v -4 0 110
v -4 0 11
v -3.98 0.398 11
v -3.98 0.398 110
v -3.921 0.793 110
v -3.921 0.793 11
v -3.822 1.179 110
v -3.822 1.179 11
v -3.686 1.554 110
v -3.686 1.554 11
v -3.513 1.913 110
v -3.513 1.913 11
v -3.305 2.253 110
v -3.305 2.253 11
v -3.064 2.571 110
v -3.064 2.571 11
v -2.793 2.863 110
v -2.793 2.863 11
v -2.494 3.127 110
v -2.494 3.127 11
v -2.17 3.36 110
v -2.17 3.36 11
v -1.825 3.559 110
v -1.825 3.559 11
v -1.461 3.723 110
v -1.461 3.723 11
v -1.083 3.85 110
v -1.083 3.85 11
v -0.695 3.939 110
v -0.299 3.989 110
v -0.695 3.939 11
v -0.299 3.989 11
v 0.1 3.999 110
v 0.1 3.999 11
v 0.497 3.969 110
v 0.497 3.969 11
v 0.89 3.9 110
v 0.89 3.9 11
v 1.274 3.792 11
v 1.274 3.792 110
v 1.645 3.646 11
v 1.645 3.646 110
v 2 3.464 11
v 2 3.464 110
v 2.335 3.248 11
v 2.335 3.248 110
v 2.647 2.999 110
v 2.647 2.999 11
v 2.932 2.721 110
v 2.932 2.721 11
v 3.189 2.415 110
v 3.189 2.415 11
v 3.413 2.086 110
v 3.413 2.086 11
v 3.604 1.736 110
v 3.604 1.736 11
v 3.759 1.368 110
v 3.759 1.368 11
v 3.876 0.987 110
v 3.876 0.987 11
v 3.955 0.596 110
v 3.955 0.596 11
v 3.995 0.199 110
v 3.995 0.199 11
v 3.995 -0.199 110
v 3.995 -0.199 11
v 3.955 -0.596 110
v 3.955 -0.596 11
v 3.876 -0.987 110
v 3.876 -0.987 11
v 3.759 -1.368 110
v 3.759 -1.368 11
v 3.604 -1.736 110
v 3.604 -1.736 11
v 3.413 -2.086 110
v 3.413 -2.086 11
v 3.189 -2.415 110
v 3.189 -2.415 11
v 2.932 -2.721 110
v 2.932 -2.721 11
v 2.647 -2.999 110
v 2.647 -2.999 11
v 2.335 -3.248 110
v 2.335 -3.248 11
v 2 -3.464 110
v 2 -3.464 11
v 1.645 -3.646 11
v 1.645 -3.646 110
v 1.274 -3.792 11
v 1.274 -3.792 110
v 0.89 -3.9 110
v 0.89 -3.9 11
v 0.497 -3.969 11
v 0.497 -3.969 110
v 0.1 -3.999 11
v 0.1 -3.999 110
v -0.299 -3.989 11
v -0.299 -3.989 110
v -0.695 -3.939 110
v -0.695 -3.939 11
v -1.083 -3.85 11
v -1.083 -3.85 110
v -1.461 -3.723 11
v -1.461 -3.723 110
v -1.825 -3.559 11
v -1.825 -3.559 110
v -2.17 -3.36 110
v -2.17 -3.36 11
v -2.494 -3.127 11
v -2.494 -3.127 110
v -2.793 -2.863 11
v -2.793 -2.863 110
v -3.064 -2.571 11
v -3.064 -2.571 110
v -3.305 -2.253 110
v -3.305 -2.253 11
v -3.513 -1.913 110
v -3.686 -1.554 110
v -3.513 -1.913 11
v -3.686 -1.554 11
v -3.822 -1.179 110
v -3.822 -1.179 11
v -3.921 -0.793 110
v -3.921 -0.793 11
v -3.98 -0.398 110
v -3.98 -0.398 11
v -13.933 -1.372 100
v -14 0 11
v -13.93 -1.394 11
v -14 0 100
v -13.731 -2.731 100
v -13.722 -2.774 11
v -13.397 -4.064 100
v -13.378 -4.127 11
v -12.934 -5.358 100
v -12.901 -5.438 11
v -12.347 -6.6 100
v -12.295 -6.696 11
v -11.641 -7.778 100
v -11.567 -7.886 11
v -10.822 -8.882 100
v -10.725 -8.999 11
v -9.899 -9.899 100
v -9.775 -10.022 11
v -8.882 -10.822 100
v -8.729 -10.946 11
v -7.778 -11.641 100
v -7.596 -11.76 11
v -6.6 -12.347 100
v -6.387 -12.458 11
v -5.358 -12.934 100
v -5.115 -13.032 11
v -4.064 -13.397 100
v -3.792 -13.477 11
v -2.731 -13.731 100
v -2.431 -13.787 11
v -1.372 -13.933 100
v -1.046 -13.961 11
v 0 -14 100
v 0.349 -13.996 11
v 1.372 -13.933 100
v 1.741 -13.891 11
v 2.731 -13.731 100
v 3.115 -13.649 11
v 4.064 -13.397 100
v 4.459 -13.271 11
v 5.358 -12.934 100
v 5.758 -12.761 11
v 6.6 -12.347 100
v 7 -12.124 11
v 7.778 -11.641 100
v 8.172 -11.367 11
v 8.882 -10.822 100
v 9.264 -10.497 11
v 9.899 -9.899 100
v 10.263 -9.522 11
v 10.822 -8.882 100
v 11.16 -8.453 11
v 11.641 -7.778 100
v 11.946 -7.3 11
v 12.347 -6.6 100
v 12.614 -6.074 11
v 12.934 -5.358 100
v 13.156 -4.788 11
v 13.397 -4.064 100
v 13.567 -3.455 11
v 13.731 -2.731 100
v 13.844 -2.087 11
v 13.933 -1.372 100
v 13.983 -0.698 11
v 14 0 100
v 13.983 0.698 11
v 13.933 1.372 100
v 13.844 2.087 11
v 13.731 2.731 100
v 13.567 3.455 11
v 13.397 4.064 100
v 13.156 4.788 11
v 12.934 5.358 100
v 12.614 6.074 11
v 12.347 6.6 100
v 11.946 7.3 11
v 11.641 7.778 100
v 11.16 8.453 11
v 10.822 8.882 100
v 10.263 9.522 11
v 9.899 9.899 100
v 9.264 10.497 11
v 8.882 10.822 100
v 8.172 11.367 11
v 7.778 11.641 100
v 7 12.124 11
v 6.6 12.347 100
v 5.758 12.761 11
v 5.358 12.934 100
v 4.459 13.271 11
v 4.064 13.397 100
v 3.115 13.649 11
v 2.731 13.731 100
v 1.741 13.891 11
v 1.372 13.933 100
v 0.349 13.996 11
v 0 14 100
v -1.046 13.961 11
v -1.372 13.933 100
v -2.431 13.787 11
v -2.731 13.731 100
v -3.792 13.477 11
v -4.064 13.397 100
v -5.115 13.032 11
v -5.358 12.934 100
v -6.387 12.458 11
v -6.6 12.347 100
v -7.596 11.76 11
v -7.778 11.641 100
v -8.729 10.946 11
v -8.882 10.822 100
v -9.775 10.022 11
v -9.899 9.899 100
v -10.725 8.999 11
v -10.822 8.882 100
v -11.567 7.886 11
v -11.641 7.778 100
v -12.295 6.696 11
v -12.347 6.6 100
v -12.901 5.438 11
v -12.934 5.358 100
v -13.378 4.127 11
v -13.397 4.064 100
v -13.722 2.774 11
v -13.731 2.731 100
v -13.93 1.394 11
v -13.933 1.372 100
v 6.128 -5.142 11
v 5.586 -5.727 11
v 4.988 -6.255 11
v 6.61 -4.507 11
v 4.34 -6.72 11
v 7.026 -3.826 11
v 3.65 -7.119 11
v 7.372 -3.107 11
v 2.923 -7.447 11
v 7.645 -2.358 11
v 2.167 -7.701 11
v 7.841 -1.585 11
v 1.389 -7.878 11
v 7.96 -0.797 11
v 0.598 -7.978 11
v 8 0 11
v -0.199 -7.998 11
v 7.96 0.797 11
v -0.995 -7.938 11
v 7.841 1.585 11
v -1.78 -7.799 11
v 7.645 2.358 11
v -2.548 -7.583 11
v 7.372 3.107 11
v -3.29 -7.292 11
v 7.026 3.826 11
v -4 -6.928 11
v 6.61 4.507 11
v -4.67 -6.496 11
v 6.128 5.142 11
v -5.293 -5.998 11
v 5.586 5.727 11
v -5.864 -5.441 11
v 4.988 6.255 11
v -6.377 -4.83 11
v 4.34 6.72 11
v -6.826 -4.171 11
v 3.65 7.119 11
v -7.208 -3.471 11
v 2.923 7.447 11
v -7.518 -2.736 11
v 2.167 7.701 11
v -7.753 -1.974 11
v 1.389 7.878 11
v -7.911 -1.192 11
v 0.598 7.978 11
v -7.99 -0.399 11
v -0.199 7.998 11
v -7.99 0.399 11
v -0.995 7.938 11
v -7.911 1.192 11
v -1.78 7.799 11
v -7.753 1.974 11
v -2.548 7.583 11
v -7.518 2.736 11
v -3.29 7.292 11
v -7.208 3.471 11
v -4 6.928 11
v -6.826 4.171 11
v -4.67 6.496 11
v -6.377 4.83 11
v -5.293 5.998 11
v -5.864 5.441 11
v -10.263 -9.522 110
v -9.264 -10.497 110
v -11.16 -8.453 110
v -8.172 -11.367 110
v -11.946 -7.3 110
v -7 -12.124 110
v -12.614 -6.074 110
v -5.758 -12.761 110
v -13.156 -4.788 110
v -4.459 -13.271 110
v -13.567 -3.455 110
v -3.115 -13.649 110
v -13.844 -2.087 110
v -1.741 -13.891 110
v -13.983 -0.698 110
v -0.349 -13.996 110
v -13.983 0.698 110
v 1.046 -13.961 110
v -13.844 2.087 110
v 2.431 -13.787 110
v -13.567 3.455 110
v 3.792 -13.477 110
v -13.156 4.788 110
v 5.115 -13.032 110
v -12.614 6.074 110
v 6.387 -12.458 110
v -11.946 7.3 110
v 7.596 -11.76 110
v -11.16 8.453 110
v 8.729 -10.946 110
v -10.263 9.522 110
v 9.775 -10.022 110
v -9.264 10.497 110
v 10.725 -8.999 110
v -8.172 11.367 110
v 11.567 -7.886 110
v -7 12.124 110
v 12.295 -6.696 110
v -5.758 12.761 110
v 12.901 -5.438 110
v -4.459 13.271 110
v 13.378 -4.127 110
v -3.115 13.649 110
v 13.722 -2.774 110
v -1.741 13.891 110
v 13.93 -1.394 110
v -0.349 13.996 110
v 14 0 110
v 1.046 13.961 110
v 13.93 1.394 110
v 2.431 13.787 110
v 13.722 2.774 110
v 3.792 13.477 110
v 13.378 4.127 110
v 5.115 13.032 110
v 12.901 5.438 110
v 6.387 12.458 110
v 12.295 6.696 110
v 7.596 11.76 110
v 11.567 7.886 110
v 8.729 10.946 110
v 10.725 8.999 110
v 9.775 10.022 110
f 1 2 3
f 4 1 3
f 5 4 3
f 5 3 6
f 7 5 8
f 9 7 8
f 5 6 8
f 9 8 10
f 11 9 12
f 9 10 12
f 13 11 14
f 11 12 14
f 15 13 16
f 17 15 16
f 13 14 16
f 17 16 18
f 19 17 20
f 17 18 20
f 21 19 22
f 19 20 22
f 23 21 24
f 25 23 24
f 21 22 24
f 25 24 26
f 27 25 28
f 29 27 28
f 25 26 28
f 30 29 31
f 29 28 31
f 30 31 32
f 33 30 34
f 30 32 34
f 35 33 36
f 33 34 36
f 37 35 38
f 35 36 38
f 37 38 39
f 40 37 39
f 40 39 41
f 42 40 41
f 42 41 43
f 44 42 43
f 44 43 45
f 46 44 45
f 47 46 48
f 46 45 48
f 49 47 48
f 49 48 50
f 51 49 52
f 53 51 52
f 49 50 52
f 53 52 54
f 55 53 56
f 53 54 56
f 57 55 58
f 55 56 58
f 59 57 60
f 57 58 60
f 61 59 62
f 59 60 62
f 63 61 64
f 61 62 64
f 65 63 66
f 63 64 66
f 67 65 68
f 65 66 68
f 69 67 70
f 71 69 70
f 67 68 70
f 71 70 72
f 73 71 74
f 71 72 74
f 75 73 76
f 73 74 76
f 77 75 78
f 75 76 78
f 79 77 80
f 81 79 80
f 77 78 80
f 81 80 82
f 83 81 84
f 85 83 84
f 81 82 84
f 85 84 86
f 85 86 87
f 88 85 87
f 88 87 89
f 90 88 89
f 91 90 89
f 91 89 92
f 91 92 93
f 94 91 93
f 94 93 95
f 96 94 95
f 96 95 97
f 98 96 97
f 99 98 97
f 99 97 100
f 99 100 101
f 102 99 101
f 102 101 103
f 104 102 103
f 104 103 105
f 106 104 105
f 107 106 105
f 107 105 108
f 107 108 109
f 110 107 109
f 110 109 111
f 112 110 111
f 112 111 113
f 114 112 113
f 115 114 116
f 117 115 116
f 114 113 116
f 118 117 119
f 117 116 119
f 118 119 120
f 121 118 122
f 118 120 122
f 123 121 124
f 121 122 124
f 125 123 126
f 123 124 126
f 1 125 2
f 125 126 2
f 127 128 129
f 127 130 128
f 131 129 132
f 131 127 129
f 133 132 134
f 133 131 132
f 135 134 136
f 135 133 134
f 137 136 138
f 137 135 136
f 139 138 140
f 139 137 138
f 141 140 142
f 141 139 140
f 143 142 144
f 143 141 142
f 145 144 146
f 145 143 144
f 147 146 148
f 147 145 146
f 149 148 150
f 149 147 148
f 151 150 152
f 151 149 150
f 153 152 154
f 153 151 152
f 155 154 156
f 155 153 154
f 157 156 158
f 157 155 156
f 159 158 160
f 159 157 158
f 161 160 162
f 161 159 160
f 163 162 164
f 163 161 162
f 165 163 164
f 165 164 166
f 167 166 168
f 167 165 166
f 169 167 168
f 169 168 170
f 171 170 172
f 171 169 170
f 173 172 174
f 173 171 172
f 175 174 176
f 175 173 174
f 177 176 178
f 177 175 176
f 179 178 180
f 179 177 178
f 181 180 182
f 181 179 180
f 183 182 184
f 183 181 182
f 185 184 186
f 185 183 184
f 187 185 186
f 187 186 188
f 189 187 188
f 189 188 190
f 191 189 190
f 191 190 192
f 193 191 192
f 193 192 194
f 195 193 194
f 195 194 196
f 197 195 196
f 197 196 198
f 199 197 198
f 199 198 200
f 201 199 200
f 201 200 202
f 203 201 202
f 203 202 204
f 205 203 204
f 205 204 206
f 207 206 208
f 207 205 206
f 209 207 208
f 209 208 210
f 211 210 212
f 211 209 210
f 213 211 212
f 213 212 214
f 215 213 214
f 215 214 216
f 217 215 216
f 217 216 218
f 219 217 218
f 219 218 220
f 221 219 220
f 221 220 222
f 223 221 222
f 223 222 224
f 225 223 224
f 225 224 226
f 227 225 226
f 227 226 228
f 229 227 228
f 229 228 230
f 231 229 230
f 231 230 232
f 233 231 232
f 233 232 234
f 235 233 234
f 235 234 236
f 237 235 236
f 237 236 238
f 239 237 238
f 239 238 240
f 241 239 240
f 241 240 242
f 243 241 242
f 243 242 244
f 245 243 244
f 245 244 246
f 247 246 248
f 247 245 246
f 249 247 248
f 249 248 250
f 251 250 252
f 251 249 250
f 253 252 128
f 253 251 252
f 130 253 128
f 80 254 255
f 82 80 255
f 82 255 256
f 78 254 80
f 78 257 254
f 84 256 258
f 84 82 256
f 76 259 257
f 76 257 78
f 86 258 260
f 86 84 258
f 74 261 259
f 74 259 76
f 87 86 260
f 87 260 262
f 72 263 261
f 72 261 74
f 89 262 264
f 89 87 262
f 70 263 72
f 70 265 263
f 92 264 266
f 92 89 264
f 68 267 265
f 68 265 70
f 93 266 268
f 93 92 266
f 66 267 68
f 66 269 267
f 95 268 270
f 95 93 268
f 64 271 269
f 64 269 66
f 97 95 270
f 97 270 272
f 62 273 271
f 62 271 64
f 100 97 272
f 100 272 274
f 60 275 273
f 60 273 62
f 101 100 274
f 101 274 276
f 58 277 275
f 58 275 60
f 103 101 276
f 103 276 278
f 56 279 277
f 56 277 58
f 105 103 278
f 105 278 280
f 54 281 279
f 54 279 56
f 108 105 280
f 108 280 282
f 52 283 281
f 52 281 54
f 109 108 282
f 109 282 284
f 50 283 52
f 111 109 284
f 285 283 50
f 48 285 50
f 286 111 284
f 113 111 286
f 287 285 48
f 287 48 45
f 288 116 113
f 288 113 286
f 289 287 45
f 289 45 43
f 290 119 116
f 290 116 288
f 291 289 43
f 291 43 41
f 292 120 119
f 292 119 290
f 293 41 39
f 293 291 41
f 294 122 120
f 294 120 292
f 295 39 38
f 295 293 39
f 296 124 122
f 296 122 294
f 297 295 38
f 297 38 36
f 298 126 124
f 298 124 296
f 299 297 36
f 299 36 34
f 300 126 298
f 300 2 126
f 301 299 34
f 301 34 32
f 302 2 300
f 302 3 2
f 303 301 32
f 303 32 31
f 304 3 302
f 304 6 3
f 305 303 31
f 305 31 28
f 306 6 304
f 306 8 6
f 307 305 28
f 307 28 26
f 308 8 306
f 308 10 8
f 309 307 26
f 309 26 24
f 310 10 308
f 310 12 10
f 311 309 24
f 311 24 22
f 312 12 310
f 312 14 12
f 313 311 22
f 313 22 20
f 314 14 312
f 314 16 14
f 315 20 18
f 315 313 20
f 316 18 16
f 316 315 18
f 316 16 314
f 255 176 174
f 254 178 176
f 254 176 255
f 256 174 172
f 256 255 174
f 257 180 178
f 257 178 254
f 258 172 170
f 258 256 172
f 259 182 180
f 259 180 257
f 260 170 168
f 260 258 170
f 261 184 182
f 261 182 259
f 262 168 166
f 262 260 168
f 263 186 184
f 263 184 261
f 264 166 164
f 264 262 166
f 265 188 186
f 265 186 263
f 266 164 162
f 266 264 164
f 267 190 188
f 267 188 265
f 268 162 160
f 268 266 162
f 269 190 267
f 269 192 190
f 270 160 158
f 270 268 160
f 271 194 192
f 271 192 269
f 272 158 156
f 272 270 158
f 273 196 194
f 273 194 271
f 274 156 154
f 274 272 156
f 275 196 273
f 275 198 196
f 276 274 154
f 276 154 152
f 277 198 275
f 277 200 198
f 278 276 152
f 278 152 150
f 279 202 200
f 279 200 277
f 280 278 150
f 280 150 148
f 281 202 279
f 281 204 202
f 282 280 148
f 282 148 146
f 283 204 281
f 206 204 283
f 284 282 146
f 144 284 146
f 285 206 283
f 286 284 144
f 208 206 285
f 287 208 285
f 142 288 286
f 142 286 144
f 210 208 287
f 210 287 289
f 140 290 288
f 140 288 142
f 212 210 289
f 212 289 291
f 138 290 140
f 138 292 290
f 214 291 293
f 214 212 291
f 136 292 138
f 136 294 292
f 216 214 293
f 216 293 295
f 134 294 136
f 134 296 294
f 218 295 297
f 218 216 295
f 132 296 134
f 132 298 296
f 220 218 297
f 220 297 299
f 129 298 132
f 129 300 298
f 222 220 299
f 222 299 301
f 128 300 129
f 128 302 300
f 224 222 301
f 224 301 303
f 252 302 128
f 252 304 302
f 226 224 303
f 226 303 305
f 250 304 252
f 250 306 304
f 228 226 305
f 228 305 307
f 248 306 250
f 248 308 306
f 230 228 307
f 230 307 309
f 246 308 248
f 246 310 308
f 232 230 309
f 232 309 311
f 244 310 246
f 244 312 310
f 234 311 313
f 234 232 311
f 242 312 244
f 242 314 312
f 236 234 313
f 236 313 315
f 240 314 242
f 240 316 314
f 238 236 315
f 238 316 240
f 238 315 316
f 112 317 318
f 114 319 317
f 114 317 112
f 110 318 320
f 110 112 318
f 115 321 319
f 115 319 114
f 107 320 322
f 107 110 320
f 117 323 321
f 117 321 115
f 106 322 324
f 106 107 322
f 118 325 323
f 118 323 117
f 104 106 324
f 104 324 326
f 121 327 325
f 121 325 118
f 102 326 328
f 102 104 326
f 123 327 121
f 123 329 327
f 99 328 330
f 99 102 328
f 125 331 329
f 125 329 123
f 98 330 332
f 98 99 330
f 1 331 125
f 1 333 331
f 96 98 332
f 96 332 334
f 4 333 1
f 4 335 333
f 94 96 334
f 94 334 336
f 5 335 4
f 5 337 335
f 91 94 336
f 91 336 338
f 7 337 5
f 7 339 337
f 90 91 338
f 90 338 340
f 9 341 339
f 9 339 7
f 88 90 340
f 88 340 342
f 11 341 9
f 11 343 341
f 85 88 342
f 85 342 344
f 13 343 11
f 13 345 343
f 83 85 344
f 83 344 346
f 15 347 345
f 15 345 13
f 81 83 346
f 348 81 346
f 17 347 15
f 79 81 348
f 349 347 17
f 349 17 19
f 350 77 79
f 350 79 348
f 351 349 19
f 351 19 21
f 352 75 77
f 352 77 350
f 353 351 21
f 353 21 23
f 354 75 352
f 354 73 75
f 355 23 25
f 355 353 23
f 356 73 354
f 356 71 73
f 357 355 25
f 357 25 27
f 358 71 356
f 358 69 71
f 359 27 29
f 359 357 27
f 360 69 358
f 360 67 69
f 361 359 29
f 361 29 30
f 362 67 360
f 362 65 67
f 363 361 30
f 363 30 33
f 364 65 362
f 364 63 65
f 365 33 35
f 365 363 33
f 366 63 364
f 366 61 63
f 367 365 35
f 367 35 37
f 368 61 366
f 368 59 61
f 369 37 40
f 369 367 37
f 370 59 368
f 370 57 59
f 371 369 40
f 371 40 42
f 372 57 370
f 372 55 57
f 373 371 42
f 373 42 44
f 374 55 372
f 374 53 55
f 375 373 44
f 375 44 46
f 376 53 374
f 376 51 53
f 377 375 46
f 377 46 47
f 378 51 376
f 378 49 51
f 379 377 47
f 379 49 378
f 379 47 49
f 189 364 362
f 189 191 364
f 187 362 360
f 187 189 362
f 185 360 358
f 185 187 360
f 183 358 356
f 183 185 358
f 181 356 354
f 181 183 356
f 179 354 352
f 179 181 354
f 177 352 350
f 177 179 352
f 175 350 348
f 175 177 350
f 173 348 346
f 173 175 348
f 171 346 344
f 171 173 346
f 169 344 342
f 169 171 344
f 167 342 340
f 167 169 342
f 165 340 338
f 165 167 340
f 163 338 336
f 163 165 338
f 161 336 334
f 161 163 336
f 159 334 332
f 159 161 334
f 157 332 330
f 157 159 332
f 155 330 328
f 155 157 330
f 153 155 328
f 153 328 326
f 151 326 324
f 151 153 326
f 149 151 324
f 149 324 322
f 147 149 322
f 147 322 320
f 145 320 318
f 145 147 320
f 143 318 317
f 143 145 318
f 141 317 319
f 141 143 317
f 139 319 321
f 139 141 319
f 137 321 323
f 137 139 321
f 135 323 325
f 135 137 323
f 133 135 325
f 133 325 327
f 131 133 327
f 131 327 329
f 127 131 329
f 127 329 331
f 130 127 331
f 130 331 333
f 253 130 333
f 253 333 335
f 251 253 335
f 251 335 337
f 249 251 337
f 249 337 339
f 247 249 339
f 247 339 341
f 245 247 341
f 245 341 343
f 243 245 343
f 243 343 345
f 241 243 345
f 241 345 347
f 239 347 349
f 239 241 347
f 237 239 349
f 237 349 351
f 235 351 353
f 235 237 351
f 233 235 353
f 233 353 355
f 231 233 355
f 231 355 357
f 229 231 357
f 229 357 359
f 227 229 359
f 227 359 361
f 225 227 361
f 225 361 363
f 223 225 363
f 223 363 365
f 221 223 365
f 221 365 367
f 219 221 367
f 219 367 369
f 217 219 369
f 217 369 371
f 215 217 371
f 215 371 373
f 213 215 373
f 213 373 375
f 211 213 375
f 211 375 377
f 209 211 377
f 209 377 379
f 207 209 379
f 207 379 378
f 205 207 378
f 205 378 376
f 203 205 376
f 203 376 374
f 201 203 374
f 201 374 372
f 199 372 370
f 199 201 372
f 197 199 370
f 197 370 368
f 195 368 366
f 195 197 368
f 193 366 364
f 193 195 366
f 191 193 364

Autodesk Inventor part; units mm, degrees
ref_plane "YZ Plane" through (0, 0, 0) normal (1, 0, 0) x (0, 1, 0)
ref_plane "XZ Plane" through (0, 0, 0) normal (0, 1, 0) x (-1, 0, 0)
ref_plane "XY Plane" through (0, 0, 0) normal (0, 0, 1) x (1, 0, 0)
sketch "Sketch1" plane through (0, 0, 0) normal (0, 0, 1) x (1, 0, 0)
  circle A0 centre (0, 0) radius 8
  dimension "d0" = 16
extrude "Extrusion1" add sketch "Sketch1" along normal blind 100
sketch "Sketch2" plane through (0, 0, 100) normal (0, 0, 1) x (1, 0, 0)
  circle A0 centre (0, 0) radius 14
  dimension "d3" = 28
extrude "Extrusion2" add sketch "Sketch2" along normal blind 10
sketch "Sketch3" plane through (0, 0, 0) normal (0, 0, -1) x (-1, 0, 0)
  circle A0 centre (0, 0) radius 8
extrude "Extrusion3" cut sketch "Sketch3" against normal blind 8
sketch "Sketch4" plane through (0, 0, 8) normal (0, 0, -1) x (-1, 0, 0)
  circle A0 centre (0, 0) radius 8
extrude "Extrusion4" cut sketch "Sketch4" against normal blind 3
sketch "Sketch5" plane through (0, 0, 11) normal (0, 0, -1) x (-1, 0, 0)
  point P0 (0, 0)
sketch "Sketch6" plane through (0, 0, 100) normal (0, 0, -1) x (-1, 0, 0)
  circle A0 centre (0, 0) radius 14
extrude "Extrusion5" add sketch "Sketch6" along normal blind 89
sketch "Sketch7" plane through (0, 0, 11) normal (0, 0, -1) x (-1, 0, 0)
  circle A0 centre (0, 0) radius 4
  dimension "d12" = 8
extrude "Extrusion6" cut sketch "Sketch7" against normal blind 100
properties part number "roll"
